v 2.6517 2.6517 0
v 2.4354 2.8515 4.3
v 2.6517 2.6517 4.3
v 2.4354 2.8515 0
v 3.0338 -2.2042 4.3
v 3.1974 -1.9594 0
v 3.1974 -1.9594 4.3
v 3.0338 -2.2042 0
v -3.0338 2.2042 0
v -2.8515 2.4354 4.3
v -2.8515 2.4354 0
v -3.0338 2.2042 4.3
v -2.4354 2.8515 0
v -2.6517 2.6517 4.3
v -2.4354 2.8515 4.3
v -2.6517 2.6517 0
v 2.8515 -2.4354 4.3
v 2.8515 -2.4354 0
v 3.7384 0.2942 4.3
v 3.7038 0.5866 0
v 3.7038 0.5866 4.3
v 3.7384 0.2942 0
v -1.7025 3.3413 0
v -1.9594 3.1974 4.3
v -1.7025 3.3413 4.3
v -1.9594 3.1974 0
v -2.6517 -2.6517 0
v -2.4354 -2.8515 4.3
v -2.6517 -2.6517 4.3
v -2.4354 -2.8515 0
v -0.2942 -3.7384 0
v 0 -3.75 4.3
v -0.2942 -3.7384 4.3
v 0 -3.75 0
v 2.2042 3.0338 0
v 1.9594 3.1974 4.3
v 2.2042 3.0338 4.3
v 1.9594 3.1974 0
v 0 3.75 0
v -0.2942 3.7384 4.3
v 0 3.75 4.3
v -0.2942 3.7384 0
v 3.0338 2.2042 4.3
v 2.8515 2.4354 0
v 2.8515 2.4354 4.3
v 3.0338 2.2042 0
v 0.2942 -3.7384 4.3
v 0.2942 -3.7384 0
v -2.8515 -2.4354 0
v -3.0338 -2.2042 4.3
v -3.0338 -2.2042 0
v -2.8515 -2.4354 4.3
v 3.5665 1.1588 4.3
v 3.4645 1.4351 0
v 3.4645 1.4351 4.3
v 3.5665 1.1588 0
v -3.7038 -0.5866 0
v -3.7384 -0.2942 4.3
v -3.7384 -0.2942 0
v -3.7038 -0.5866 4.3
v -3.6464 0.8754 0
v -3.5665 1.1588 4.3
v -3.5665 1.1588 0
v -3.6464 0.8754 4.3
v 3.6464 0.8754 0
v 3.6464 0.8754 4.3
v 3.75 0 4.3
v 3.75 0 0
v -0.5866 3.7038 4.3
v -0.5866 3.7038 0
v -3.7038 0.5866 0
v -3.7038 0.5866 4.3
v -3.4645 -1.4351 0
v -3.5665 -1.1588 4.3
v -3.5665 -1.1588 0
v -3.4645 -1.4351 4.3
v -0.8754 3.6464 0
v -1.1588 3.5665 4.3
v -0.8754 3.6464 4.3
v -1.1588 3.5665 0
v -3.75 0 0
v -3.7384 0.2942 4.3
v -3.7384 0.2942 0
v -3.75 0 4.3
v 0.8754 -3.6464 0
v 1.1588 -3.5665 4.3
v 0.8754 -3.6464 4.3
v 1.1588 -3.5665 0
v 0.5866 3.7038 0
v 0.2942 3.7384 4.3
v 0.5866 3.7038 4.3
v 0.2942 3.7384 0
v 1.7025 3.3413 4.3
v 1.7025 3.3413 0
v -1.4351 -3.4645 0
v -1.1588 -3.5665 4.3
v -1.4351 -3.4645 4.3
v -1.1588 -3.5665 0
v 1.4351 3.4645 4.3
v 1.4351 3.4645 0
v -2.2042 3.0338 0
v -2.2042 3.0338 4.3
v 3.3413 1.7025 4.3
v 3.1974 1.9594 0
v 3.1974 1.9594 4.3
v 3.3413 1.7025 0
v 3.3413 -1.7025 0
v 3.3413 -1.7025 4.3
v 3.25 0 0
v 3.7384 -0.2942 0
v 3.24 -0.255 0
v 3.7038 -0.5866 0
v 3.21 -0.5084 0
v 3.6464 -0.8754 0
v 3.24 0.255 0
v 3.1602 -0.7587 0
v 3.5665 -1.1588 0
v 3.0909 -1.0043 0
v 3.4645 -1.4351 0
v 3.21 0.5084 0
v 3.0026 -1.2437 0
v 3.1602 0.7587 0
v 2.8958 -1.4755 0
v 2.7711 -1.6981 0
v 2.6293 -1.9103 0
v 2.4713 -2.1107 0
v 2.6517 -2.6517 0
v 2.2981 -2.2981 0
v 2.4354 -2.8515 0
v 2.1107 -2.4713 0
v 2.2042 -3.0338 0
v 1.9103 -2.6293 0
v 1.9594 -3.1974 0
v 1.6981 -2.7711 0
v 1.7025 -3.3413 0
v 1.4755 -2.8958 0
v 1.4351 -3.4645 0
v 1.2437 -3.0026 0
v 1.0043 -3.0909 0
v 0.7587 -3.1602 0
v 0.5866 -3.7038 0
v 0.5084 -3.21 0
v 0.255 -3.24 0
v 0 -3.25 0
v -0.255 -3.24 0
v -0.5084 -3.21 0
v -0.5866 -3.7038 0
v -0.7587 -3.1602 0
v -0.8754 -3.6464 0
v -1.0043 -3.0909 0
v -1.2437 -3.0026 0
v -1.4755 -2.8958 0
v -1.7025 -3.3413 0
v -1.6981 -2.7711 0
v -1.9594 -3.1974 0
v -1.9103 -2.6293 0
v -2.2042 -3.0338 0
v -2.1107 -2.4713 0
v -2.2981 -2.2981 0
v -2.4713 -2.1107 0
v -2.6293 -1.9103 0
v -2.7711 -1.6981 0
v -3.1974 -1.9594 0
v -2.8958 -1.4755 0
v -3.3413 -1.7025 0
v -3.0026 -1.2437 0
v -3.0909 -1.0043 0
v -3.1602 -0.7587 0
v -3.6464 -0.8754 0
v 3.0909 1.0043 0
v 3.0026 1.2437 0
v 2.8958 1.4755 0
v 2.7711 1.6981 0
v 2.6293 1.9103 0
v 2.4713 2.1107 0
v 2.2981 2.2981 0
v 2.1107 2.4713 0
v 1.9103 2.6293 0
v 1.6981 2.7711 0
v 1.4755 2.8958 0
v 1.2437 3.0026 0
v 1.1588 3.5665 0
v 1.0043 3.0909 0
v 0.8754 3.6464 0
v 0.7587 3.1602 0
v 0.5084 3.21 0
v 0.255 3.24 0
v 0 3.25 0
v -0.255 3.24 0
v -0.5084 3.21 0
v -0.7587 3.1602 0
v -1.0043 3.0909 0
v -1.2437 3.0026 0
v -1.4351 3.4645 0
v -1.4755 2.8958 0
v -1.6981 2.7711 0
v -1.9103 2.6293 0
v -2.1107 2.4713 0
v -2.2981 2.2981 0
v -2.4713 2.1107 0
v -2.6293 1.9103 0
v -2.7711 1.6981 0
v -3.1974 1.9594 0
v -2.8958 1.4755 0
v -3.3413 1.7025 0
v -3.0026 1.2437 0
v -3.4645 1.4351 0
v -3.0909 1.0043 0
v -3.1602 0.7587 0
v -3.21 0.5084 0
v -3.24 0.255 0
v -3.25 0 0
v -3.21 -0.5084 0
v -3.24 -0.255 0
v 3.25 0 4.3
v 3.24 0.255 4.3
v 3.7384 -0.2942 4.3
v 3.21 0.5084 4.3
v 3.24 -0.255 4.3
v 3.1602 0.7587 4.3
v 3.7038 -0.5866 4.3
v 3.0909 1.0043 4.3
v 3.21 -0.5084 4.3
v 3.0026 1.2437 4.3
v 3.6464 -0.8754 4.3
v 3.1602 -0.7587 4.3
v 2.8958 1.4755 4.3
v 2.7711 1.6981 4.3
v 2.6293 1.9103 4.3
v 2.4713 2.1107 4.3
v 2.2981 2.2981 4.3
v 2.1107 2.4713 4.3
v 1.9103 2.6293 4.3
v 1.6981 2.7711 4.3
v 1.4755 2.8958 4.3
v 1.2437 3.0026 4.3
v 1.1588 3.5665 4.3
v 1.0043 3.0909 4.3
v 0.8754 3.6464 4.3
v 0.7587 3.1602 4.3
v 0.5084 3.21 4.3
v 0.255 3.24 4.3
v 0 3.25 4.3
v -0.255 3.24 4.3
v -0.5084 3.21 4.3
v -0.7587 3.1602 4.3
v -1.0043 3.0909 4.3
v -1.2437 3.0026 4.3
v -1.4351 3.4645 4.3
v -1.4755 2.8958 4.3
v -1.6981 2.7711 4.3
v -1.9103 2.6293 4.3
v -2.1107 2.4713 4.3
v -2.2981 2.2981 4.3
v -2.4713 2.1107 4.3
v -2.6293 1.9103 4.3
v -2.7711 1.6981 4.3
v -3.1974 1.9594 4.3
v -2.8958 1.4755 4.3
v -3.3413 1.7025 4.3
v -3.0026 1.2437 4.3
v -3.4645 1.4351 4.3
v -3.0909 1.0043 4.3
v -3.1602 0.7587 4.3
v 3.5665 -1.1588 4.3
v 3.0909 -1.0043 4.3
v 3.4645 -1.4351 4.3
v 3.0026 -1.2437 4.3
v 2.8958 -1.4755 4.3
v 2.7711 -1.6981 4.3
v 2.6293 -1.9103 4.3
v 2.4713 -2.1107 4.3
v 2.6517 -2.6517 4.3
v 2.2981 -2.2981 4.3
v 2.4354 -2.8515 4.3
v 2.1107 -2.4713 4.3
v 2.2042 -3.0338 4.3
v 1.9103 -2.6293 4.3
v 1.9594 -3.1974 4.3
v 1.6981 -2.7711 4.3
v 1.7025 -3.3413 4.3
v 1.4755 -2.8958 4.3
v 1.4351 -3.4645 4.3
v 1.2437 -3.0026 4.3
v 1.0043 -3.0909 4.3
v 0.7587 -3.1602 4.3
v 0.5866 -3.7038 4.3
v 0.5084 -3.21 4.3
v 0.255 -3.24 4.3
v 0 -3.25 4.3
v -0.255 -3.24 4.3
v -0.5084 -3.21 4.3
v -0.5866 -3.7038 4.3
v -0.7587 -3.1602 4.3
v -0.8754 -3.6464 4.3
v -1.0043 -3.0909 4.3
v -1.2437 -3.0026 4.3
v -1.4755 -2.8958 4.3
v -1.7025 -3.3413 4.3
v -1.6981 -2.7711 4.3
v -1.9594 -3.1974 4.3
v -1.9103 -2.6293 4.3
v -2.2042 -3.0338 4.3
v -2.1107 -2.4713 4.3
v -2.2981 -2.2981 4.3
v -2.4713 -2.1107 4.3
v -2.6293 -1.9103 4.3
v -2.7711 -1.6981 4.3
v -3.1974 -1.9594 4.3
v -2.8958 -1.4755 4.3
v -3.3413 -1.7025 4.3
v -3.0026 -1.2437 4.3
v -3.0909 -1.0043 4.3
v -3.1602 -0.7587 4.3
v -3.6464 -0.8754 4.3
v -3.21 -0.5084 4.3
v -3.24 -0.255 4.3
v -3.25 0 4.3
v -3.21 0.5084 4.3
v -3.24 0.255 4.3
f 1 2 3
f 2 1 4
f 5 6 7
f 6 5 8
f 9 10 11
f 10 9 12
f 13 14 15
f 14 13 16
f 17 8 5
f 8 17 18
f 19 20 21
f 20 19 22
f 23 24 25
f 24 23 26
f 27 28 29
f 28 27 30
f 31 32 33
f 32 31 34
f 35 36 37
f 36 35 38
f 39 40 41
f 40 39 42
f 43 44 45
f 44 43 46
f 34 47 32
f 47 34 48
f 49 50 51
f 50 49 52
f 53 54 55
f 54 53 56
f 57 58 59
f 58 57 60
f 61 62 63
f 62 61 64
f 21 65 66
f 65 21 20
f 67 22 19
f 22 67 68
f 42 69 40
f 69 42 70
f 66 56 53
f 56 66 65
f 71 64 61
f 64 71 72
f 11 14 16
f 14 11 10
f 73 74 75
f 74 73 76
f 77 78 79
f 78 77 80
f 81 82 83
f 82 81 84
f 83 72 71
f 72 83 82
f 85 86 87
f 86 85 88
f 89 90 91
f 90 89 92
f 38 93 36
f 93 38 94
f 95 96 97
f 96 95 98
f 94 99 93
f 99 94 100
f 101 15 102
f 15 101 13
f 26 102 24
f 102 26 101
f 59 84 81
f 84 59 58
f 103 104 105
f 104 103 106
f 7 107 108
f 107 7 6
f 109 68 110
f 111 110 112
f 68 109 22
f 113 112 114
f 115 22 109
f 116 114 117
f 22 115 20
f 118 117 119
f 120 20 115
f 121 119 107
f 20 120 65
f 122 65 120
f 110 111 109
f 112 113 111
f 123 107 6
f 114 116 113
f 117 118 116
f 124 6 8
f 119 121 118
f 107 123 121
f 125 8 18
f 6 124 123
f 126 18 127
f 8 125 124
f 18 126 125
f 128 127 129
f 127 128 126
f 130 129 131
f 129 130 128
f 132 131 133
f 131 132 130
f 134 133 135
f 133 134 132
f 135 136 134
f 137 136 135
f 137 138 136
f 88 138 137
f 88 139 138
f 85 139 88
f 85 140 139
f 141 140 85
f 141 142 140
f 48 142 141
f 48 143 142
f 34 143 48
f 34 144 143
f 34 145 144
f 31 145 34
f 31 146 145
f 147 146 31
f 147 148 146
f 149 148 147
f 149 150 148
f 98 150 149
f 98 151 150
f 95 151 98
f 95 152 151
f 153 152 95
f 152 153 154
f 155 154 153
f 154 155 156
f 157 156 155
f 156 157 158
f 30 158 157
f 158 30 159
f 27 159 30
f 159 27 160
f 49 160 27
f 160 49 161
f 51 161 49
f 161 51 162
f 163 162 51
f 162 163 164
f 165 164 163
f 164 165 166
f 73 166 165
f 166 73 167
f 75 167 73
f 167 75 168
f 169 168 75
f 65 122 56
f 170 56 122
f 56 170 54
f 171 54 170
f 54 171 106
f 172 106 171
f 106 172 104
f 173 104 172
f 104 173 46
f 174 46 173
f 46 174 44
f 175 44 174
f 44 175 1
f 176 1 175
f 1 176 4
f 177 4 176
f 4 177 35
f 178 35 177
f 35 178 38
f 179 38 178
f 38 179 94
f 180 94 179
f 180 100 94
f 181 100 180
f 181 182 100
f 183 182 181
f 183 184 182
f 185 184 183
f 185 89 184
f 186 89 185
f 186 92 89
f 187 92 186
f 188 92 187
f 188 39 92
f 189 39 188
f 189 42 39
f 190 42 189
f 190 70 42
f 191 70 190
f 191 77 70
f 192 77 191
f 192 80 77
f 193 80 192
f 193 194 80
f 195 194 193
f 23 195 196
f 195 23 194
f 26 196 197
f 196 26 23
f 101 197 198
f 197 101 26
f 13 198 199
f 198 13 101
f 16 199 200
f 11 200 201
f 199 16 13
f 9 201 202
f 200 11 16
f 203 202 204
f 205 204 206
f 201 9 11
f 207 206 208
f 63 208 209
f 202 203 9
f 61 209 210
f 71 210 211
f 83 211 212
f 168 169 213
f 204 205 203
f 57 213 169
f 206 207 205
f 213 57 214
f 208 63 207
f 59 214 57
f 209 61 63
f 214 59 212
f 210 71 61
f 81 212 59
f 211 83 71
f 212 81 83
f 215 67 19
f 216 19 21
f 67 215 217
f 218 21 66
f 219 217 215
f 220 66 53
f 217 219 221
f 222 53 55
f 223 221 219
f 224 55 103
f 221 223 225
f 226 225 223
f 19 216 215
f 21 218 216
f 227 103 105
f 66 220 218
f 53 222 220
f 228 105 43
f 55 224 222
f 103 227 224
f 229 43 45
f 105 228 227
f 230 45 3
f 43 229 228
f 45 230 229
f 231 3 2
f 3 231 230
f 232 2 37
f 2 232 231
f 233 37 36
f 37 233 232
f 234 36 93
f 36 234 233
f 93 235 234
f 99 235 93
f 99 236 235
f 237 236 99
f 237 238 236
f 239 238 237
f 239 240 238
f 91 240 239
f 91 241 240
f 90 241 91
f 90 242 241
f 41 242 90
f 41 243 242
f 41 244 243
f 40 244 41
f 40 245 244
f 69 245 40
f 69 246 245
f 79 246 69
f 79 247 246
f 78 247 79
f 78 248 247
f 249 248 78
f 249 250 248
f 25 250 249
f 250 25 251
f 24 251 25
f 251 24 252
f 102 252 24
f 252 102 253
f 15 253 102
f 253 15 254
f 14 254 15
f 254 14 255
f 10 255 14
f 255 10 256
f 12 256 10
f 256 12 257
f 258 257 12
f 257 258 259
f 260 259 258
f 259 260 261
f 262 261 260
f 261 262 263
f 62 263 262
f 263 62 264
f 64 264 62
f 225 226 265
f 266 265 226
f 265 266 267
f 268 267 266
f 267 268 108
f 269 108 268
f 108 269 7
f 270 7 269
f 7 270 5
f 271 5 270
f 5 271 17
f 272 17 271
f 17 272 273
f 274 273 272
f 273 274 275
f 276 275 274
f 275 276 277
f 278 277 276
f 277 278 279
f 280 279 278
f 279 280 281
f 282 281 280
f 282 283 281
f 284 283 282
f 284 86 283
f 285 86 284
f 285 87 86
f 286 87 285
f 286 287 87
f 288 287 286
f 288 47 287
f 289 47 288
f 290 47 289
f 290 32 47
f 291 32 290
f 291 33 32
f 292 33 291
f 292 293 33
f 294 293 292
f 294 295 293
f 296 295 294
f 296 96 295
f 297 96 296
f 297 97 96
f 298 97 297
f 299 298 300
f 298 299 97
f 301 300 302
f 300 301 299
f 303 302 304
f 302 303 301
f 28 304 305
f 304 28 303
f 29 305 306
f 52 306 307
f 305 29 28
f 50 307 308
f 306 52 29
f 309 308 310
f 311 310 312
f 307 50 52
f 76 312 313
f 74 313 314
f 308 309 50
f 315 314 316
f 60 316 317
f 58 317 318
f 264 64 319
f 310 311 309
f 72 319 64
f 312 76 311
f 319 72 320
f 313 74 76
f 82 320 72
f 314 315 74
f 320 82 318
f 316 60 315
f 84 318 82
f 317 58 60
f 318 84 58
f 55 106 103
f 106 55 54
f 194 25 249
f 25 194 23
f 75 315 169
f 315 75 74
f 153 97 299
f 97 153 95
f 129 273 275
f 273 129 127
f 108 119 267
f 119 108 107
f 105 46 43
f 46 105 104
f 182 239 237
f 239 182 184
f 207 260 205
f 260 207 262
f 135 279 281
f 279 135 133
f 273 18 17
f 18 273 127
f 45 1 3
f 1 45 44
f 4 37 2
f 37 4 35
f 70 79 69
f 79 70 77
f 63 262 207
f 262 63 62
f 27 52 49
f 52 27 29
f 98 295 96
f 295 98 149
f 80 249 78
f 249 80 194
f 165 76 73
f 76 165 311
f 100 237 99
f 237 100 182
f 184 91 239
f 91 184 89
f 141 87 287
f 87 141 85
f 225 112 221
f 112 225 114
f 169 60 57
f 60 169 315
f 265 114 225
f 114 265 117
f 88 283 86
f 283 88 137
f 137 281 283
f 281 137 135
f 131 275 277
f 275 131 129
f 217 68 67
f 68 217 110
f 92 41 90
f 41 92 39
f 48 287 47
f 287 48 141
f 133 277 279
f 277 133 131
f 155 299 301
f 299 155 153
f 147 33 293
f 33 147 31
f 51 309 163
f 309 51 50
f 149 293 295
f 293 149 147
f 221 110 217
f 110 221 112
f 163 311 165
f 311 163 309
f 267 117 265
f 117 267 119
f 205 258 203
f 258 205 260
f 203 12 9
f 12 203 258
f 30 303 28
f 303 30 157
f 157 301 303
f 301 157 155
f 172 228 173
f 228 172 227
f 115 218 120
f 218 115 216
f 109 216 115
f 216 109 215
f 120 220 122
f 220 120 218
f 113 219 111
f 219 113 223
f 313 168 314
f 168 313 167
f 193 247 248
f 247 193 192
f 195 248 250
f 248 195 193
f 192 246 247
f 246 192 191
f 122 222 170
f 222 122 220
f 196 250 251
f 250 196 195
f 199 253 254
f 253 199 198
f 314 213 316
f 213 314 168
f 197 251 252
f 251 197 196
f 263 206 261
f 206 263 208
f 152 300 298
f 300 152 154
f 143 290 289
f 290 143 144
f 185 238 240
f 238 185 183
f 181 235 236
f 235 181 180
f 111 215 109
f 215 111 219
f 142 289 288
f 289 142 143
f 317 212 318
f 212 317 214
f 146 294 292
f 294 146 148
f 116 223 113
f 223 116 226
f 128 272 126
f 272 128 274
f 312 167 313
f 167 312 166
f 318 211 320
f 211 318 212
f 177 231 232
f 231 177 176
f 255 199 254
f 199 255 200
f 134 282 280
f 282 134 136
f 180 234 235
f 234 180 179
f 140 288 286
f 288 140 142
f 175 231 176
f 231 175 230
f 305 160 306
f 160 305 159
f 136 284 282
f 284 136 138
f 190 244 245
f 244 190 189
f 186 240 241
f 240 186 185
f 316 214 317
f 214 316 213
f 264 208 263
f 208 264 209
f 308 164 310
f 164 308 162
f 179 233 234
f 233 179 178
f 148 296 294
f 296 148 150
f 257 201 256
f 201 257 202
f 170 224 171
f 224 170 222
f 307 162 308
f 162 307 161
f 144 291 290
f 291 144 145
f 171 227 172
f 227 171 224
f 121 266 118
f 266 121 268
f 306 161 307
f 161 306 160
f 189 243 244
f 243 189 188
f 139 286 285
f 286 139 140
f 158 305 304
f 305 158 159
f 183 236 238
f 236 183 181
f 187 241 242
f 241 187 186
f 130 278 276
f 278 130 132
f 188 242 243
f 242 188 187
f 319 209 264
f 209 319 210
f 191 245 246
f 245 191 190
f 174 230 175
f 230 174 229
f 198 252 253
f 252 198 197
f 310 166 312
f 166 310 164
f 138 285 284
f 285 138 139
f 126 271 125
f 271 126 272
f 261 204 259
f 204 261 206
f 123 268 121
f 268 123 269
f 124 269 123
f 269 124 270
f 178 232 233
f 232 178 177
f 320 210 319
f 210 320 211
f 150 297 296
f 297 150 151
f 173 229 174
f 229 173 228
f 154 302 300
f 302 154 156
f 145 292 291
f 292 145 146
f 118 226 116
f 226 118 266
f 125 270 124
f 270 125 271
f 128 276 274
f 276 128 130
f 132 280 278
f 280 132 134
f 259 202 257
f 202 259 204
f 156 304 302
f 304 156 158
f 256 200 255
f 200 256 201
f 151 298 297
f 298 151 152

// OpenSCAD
// Renata's button to cover the new watch button
// Use the spiral (vase) print, the top won't be printed.
// Also used the 0.1 (fine) print setting.

diameter=6.5;
thick=1.0;
depth=4.3;
futz=0.01;

module All() {
  difference() {
    Cylinder();
  }
}

module Cylinder() {
    difference() {
      cylinder(h=depth, d=diameter+thick, $fn=80);
      translate([0, 0, -thick])
        cylinder(h=depth+thick*2,d=diameter, $fn=80);
    }
}

module CenterPunch() {
  cp_off_ground=2;
  cp_diameter=1.8;
  translate([0, 0, cp_off_ground])
    cylinder(h=depth, d=cp_diameter, $fn=80);
}

All();
